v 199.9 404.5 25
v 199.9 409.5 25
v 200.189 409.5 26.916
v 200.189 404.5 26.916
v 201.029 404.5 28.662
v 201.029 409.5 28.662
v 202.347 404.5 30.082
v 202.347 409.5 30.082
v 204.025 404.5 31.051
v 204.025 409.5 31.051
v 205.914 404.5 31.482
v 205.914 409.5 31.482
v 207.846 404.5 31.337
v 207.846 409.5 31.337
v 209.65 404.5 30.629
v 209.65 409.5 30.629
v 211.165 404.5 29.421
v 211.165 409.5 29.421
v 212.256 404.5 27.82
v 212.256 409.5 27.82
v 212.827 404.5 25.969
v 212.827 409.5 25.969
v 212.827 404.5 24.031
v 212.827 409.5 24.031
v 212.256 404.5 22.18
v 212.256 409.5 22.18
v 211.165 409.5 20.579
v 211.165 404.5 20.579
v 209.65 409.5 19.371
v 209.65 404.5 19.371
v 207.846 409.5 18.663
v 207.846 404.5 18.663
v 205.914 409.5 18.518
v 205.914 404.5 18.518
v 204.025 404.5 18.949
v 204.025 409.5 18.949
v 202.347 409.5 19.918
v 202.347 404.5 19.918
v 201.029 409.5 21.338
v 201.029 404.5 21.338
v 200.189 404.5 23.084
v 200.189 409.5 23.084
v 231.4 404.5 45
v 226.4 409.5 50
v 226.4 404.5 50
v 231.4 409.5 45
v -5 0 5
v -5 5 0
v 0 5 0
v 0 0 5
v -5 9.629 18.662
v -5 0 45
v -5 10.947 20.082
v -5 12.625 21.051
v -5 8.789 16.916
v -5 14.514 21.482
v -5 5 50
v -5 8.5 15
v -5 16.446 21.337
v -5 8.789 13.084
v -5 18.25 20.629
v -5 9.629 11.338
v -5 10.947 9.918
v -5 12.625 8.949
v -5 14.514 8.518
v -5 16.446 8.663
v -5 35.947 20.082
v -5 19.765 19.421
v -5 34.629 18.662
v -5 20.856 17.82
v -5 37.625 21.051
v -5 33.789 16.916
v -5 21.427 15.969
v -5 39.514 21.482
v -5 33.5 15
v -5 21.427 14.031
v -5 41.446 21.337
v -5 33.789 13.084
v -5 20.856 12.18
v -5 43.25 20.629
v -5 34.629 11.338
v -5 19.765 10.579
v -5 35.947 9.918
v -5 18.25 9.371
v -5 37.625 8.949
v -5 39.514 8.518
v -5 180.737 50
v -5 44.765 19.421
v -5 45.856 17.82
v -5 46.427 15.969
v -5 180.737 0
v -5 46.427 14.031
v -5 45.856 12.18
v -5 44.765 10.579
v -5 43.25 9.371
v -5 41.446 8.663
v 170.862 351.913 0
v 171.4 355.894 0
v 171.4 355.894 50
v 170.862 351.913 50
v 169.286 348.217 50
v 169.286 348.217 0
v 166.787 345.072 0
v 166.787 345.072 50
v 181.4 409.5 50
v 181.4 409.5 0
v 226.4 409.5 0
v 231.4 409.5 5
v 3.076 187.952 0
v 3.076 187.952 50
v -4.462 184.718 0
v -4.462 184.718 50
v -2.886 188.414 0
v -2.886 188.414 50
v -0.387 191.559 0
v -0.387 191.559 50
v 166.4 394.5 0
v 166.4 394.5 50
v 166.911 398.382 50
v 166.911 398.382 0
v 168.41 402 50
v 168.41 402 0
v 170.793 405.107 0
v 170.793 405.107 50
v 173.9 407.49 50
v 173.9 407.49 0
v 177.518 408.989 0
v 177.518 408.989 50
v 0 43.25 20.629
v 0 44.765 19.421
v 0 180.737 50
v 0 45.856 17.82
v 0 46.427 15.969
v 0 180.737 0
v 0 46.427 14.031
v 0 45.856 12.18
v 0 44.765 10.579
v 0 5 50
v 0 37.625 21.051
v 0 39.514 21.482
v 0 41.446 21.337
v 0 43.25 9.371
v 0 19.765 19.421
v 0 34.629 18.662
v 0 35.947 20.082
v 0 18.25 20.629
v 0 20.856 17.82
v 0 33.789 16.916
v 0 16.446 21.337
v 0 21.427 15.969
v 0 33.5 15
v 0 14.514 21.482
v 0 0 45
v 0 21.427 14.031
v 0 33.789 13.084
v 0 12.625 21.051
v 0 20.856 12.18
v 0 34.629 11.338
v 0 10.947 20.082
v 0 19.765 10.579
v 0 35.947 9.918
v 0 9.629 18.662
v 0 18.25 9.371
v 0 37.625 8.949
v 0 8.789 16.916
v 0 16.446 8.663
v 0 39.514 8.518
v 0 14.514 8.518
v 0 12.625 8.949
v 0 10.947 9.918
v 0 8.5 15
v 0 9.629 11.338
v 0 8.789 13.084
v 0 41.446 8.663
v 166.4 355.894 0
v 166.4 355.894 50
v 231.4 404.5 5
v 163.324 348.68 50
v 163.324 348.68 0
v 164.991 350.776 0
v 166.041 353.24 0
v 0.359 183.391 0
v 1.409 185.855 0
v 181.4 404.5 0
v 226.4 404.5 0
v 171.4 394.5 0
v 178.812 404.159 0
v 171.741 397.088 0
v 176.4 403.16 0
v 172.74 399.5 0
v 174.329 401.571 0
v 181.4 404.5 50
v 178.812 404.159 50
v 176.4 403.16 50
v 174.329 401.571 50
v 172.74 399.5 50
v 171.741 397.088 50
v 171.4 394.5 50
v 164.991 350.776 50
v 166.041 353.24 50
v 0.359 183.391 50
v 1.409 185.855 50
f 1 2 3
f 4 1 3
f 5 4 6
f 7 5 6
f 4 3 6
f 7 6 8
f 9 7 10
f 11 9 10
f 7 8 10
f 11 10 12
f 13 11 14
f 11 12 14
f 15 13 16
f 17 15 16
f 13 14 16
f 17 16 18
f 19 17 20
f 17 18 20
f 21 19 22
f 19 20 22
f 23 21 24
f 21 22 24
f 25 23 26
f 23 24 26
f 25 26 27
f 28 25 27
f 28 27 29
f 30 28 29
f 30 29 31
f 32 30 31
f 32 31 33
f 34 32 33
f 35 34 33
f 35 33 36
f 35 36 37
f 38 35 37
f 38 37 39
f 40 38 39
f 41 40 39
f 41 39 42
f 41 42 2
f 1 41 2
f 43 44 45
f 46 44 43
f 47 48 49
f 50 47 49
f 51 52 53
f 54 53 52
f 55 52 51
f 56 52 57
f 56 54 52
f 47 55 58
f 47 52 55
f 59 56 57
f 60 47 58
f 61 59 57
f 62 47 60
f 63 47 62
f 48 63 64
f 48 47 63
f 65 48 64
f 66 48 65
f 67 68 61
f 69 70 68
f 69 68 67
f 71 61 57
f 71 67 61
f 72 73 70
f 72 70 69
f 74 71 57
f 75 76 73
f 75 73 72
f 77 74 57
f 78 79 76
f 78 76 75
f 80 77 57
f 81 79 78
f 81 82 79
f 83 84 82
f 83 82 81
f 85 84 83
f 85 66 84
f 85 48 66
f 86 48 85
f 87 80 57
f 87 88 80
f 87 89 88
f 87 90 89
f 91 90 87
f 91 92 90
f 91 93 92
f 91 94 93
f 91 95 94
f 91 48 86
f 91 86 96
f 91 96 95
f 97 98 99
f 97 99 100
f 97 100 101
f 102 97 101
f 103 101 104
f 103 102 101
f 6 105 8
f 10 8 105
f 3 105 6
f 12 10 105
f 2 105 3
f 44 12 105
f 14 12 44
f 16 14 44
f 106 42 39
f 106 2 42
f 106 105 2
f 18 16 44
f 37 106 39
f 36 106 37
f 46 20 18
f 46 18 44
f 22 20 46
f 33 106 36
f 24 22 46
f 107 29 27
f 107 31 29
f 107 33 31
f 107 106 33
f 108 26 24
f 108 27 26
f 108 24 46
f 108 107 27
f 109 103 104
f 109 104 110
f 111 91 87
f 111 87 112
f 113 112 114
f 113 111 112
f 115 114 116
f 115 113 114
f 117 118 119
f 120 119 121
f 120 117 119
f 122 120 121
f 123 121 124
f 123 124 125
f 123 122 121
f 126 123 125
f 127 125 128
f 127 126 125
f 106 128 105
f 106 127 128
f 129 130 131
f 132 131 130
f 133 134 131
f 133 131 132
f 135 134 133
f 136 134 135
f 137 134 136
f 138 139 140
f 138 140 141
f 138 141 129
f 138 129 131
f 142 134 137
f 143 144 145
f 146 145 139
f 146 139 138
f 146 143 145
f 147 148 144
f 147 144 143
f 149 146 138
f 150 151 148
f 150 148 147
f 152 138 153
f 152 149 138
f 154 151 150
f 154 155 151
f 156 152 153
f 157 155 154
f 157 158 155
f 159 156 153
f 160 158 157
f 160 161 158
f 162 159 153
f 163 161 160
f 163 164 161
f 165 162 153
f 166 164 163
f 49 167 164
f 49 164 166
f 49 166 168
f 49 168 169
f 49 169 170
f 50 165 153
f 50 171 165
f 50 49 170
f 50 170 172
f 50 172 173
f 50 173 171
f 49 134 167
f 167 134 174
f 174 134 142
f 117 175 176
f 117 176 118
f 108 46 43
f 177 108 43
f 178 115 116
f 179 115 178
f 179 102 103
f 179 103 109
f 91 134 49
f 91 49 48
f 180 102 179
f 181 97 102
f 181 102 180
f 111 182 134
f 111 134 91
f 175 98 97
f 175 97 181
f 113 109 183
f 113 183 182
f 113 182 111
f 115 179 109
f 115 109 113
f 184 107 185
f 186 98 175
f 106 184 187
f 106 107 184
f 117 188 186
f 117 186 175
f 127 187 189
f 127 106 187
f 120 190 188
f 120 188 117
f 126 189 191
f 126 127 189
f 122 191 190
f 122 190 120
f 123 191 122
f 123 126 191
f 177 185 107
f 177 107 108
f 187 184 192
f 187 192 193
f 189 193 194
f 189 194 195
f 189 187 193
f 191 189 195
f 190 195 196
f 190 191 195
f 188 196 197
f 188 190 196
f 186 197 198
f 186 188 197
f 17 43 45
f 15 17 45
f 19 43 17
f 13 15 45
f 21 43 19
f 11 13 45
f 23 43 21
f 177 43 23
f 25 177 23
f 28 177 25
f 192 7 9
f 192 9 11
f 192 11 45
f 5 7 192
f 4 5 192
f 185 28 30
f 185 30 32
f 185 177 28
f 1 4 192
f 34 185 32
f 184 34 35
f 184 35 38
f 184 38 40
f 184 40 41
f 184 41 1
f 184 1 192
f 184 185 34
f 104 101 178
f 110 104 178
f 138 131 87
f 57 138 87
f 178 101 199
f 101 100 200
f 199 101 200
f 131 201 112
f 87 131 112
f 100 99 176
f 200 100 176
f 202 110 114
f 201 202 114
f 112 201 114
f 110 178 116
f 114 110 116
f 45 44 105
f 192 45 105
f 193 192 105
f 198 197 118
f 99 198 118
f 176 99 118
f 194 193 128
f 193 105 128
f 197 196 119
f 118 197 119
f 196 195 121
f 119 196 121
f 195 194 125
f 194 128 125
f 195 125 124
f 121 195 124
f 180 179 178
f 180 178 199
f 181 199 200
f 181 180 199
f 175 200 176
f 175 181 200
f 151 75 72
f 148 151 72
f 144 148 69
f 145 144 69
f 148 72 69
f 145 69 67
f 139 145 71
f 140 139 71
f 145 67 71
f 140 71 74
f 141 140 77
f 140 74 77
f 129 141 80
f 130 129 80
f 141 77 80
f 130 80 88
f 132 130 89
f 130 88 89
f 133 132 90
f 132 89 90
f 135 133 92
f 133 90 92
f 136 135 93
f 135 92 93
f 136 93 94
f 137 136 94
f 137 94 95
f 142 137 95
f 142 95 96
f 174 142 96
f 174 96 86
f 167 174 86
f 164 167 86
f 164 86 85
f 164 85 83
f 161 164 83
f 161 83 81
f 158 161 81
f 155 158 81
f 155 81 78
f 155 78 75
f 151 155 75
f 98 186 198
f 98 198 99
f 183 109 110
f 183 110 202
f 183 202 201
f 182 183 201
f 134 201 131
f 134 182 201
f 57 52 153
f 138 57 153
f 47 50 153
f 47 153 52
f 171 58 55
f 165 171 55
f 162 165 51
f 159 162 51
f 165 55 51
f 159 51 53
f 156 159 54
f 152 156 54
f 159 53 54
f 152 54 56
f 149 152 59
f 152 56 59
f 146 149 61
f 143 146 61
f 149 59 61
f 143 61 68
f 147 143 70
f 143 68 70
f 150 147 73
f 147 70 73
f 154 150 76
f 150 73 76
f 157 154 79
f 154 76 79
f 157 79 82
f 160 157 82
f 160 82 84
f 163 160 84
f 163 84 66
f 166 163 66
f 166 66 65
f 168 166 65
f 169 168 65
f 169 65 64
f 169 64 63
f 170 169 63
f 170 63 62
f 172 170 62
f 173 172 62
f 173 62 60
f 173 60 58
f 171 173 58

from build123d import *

# Parameters (mm, degrees)
SM_BASE_FLANGE_1_DEPTH = 50
SKETCH_6_R             = 6.5
CUT_EXTRUDE_1_DEPTH    = 10
SKETCH_7_R             = 6.5
CUT_EXTRUDE_2_DEPTH    = 10
OTHER_START            = 160.088975261
OTHER_1_OUTLINE_W      = 10
OTHER_1_OUTLINE_H      = 8
OTHER_1_DEPTH          = 3.535533906
OTHER_START_2          = 195.44431432
OTHER_1_2_OUTLINE_W    = 39
OTHER_1_2_OUTLINE_H    = 8
OTHER_1_2_DEPTH        = 3.535533906
OTHER_1_3_OUTLINE_W    = 7
OTHER_1_3_OUTLINE_H    = 10
OTHER_1_3_DEPTH        = 3.535533906
OTHER_START_3          = -35.355339059
OTHER_1_4_OUTLINE_W    = 7
OTHER_1_4_OUTLINE_H    = 38
OTHER_1_4_DEPTH        = 3.535533906


# Read off the part's stored shape, not the designer's step: Затупленный угол1
# Sheet-metal steps are written as plain solids
with BuildPart() as part:
    # Sketch 1 → Базовая кромка1 (new body)
    with BuildSketch(Plane.XY):
        with BuildLine():
            Line((231.4, 404.5), (181.4, 404.5))
            ThreePointArc((181.4, 404.5), (174.328932188, 401.571067812), (171.4, 394.5))
            Line((171.4, 394.5), (171.4, 355.894452277))
            ThreePointArc((171.4, 355.894452277), (170.198513935, 350.012189687), (166.786531576, 345.072254634))
            Line((166.786531576, 345.072254634), (3.075645616, 187.951830244))
            ThreePointArc((3.075645616, 187.951830244), (0.80099071, 184.658540209), (0, 180.737031815))
            Line((0, 180.737031815), (0, 0))
            Line((0, 0), (-5, 0))
            Line((-5, 0), (-5, 180.737031815))
            ThreePointArc((-5, 180.737031815), (-3.798513935, 186.619294405), (-0.386531576, 191.559229458))
            Line((-0.386531576, 191.559229458), (163.324354384, 348.679653848))
            ThreePointArc((163.324354384, 348.679653848), (165.59900929, 351.972943883), (166.4, 355.894452277))
            Line((166.4, 355.894452277), (166.4, 394.5))
            ThreePointArc((166.4, 394.5), (170.793398282, 405.106601718), (181.4, 409.5))
            Line((181.4, 409.5), (231.4, 409.5))
            Line((231.4, 409.5), (231.4, 404.5))
        make_face()
    extrude(amount=SM_BASE_FLANGE_1_DEPTH)

    # Эскиз6 → Вырез-Вытянуть1 (cut)
    with BuildSketch(Plane.ZY.offset(5)):
        with Locations(Location((15, 15, 0), (0, 0, 270))):
            Circle(SKETCH_6_R)
        with Locations(Location((15, 40, 0), (0, 0, 270))):
            Circle(SKETCH_6_R)
    extrude(amount=-CUT_EXTRUDE_1_DEPTH, mode=Mode.SUBTRACT)

    # Эскиз7 → Вырез-Вытянуть2 (cut)
    with BuildSketch(Plane(origin=(0, 409.5, 0), x_dir=(1, 0, 0), z_dir=(0, 1, 0))):
        with Locations(Location((206.4, -25, 0), (0, 0, 180))):
            Circle(SKETCH_7_R)
    extrude(amount=-CUT_EXTRUDE_2_DEPTH, mode=Mode.SUBTRACT)

    # Other 1 outline → Other 1 (cut)
    with BuildSketch(Plane(origin=(0, 0, 0), x_dir=(0.707106781186548, 0, 0.707106781186547), z_dir=(0.707106781186547, 0, -0.707106781186548)).offset(OTHER_START)):
        with Locations((164, -407)):
            Rectangle(OTHER_1_OUTLINE_W, OTHER_1_OUTLINE_H)
    extrude(amount=OTHER_1_DEPTH, mode=Mode.SUBTRACT)

    # Other 1 2 outline → Other 1 2 (cut)
    with BuildSketch(Plane(origin=(0, 0, 0), x_dir=(0.707106781186548, 0, -0.707106781186547), z_dir=(0.707106781186547, 0, 0.707106781186548)).offset(OTHER_START_2)):
        with Locations((142.5, 407)):
            Rectangle(OTHER_1_2_OUTLINE_W, OTHER_1_2_OUTLINE_H)
    extrude(amount=OTHER_1_2_DEPTH, mode=Mode.SUBTRACT)

    # Other 1 3 outline → Other 1 3 (cut)
    with BuildSketch(Plane(origin=(0, 0, 0), x_dir=(1, 0, 0), z_dir=(0, 0.707106781186547, 0.707106781186548))):
        with Locations((-2.5, 0)):
            Rectangle(OTHER_1_3_OUTLINE_W, OTHER_1_3_OUTLINE_H)
    extrude(amount=OTHER_1_3_DEPTH, mode=Mode.SUBTRACT)

    # Other 1 4 outline → Other 1 4 (cut)
    with BuildSketch(Plane(origin=(0, 0, 0), x_dir=(1, 0, 0), z_dir=(0, 0.707106781186547, -0.707106781186548)).offset(OTHER_START_3)):
        with Locations((-2.5, -21)):
            Rectangle(OTHER_1_4_OUTLINE_W, OTHER_1_4_OUTLINE_H)
    extrude(amount=OTHER_1_4_DEPTH, mode=Mode.SUBTRACT)


solid = part.part
